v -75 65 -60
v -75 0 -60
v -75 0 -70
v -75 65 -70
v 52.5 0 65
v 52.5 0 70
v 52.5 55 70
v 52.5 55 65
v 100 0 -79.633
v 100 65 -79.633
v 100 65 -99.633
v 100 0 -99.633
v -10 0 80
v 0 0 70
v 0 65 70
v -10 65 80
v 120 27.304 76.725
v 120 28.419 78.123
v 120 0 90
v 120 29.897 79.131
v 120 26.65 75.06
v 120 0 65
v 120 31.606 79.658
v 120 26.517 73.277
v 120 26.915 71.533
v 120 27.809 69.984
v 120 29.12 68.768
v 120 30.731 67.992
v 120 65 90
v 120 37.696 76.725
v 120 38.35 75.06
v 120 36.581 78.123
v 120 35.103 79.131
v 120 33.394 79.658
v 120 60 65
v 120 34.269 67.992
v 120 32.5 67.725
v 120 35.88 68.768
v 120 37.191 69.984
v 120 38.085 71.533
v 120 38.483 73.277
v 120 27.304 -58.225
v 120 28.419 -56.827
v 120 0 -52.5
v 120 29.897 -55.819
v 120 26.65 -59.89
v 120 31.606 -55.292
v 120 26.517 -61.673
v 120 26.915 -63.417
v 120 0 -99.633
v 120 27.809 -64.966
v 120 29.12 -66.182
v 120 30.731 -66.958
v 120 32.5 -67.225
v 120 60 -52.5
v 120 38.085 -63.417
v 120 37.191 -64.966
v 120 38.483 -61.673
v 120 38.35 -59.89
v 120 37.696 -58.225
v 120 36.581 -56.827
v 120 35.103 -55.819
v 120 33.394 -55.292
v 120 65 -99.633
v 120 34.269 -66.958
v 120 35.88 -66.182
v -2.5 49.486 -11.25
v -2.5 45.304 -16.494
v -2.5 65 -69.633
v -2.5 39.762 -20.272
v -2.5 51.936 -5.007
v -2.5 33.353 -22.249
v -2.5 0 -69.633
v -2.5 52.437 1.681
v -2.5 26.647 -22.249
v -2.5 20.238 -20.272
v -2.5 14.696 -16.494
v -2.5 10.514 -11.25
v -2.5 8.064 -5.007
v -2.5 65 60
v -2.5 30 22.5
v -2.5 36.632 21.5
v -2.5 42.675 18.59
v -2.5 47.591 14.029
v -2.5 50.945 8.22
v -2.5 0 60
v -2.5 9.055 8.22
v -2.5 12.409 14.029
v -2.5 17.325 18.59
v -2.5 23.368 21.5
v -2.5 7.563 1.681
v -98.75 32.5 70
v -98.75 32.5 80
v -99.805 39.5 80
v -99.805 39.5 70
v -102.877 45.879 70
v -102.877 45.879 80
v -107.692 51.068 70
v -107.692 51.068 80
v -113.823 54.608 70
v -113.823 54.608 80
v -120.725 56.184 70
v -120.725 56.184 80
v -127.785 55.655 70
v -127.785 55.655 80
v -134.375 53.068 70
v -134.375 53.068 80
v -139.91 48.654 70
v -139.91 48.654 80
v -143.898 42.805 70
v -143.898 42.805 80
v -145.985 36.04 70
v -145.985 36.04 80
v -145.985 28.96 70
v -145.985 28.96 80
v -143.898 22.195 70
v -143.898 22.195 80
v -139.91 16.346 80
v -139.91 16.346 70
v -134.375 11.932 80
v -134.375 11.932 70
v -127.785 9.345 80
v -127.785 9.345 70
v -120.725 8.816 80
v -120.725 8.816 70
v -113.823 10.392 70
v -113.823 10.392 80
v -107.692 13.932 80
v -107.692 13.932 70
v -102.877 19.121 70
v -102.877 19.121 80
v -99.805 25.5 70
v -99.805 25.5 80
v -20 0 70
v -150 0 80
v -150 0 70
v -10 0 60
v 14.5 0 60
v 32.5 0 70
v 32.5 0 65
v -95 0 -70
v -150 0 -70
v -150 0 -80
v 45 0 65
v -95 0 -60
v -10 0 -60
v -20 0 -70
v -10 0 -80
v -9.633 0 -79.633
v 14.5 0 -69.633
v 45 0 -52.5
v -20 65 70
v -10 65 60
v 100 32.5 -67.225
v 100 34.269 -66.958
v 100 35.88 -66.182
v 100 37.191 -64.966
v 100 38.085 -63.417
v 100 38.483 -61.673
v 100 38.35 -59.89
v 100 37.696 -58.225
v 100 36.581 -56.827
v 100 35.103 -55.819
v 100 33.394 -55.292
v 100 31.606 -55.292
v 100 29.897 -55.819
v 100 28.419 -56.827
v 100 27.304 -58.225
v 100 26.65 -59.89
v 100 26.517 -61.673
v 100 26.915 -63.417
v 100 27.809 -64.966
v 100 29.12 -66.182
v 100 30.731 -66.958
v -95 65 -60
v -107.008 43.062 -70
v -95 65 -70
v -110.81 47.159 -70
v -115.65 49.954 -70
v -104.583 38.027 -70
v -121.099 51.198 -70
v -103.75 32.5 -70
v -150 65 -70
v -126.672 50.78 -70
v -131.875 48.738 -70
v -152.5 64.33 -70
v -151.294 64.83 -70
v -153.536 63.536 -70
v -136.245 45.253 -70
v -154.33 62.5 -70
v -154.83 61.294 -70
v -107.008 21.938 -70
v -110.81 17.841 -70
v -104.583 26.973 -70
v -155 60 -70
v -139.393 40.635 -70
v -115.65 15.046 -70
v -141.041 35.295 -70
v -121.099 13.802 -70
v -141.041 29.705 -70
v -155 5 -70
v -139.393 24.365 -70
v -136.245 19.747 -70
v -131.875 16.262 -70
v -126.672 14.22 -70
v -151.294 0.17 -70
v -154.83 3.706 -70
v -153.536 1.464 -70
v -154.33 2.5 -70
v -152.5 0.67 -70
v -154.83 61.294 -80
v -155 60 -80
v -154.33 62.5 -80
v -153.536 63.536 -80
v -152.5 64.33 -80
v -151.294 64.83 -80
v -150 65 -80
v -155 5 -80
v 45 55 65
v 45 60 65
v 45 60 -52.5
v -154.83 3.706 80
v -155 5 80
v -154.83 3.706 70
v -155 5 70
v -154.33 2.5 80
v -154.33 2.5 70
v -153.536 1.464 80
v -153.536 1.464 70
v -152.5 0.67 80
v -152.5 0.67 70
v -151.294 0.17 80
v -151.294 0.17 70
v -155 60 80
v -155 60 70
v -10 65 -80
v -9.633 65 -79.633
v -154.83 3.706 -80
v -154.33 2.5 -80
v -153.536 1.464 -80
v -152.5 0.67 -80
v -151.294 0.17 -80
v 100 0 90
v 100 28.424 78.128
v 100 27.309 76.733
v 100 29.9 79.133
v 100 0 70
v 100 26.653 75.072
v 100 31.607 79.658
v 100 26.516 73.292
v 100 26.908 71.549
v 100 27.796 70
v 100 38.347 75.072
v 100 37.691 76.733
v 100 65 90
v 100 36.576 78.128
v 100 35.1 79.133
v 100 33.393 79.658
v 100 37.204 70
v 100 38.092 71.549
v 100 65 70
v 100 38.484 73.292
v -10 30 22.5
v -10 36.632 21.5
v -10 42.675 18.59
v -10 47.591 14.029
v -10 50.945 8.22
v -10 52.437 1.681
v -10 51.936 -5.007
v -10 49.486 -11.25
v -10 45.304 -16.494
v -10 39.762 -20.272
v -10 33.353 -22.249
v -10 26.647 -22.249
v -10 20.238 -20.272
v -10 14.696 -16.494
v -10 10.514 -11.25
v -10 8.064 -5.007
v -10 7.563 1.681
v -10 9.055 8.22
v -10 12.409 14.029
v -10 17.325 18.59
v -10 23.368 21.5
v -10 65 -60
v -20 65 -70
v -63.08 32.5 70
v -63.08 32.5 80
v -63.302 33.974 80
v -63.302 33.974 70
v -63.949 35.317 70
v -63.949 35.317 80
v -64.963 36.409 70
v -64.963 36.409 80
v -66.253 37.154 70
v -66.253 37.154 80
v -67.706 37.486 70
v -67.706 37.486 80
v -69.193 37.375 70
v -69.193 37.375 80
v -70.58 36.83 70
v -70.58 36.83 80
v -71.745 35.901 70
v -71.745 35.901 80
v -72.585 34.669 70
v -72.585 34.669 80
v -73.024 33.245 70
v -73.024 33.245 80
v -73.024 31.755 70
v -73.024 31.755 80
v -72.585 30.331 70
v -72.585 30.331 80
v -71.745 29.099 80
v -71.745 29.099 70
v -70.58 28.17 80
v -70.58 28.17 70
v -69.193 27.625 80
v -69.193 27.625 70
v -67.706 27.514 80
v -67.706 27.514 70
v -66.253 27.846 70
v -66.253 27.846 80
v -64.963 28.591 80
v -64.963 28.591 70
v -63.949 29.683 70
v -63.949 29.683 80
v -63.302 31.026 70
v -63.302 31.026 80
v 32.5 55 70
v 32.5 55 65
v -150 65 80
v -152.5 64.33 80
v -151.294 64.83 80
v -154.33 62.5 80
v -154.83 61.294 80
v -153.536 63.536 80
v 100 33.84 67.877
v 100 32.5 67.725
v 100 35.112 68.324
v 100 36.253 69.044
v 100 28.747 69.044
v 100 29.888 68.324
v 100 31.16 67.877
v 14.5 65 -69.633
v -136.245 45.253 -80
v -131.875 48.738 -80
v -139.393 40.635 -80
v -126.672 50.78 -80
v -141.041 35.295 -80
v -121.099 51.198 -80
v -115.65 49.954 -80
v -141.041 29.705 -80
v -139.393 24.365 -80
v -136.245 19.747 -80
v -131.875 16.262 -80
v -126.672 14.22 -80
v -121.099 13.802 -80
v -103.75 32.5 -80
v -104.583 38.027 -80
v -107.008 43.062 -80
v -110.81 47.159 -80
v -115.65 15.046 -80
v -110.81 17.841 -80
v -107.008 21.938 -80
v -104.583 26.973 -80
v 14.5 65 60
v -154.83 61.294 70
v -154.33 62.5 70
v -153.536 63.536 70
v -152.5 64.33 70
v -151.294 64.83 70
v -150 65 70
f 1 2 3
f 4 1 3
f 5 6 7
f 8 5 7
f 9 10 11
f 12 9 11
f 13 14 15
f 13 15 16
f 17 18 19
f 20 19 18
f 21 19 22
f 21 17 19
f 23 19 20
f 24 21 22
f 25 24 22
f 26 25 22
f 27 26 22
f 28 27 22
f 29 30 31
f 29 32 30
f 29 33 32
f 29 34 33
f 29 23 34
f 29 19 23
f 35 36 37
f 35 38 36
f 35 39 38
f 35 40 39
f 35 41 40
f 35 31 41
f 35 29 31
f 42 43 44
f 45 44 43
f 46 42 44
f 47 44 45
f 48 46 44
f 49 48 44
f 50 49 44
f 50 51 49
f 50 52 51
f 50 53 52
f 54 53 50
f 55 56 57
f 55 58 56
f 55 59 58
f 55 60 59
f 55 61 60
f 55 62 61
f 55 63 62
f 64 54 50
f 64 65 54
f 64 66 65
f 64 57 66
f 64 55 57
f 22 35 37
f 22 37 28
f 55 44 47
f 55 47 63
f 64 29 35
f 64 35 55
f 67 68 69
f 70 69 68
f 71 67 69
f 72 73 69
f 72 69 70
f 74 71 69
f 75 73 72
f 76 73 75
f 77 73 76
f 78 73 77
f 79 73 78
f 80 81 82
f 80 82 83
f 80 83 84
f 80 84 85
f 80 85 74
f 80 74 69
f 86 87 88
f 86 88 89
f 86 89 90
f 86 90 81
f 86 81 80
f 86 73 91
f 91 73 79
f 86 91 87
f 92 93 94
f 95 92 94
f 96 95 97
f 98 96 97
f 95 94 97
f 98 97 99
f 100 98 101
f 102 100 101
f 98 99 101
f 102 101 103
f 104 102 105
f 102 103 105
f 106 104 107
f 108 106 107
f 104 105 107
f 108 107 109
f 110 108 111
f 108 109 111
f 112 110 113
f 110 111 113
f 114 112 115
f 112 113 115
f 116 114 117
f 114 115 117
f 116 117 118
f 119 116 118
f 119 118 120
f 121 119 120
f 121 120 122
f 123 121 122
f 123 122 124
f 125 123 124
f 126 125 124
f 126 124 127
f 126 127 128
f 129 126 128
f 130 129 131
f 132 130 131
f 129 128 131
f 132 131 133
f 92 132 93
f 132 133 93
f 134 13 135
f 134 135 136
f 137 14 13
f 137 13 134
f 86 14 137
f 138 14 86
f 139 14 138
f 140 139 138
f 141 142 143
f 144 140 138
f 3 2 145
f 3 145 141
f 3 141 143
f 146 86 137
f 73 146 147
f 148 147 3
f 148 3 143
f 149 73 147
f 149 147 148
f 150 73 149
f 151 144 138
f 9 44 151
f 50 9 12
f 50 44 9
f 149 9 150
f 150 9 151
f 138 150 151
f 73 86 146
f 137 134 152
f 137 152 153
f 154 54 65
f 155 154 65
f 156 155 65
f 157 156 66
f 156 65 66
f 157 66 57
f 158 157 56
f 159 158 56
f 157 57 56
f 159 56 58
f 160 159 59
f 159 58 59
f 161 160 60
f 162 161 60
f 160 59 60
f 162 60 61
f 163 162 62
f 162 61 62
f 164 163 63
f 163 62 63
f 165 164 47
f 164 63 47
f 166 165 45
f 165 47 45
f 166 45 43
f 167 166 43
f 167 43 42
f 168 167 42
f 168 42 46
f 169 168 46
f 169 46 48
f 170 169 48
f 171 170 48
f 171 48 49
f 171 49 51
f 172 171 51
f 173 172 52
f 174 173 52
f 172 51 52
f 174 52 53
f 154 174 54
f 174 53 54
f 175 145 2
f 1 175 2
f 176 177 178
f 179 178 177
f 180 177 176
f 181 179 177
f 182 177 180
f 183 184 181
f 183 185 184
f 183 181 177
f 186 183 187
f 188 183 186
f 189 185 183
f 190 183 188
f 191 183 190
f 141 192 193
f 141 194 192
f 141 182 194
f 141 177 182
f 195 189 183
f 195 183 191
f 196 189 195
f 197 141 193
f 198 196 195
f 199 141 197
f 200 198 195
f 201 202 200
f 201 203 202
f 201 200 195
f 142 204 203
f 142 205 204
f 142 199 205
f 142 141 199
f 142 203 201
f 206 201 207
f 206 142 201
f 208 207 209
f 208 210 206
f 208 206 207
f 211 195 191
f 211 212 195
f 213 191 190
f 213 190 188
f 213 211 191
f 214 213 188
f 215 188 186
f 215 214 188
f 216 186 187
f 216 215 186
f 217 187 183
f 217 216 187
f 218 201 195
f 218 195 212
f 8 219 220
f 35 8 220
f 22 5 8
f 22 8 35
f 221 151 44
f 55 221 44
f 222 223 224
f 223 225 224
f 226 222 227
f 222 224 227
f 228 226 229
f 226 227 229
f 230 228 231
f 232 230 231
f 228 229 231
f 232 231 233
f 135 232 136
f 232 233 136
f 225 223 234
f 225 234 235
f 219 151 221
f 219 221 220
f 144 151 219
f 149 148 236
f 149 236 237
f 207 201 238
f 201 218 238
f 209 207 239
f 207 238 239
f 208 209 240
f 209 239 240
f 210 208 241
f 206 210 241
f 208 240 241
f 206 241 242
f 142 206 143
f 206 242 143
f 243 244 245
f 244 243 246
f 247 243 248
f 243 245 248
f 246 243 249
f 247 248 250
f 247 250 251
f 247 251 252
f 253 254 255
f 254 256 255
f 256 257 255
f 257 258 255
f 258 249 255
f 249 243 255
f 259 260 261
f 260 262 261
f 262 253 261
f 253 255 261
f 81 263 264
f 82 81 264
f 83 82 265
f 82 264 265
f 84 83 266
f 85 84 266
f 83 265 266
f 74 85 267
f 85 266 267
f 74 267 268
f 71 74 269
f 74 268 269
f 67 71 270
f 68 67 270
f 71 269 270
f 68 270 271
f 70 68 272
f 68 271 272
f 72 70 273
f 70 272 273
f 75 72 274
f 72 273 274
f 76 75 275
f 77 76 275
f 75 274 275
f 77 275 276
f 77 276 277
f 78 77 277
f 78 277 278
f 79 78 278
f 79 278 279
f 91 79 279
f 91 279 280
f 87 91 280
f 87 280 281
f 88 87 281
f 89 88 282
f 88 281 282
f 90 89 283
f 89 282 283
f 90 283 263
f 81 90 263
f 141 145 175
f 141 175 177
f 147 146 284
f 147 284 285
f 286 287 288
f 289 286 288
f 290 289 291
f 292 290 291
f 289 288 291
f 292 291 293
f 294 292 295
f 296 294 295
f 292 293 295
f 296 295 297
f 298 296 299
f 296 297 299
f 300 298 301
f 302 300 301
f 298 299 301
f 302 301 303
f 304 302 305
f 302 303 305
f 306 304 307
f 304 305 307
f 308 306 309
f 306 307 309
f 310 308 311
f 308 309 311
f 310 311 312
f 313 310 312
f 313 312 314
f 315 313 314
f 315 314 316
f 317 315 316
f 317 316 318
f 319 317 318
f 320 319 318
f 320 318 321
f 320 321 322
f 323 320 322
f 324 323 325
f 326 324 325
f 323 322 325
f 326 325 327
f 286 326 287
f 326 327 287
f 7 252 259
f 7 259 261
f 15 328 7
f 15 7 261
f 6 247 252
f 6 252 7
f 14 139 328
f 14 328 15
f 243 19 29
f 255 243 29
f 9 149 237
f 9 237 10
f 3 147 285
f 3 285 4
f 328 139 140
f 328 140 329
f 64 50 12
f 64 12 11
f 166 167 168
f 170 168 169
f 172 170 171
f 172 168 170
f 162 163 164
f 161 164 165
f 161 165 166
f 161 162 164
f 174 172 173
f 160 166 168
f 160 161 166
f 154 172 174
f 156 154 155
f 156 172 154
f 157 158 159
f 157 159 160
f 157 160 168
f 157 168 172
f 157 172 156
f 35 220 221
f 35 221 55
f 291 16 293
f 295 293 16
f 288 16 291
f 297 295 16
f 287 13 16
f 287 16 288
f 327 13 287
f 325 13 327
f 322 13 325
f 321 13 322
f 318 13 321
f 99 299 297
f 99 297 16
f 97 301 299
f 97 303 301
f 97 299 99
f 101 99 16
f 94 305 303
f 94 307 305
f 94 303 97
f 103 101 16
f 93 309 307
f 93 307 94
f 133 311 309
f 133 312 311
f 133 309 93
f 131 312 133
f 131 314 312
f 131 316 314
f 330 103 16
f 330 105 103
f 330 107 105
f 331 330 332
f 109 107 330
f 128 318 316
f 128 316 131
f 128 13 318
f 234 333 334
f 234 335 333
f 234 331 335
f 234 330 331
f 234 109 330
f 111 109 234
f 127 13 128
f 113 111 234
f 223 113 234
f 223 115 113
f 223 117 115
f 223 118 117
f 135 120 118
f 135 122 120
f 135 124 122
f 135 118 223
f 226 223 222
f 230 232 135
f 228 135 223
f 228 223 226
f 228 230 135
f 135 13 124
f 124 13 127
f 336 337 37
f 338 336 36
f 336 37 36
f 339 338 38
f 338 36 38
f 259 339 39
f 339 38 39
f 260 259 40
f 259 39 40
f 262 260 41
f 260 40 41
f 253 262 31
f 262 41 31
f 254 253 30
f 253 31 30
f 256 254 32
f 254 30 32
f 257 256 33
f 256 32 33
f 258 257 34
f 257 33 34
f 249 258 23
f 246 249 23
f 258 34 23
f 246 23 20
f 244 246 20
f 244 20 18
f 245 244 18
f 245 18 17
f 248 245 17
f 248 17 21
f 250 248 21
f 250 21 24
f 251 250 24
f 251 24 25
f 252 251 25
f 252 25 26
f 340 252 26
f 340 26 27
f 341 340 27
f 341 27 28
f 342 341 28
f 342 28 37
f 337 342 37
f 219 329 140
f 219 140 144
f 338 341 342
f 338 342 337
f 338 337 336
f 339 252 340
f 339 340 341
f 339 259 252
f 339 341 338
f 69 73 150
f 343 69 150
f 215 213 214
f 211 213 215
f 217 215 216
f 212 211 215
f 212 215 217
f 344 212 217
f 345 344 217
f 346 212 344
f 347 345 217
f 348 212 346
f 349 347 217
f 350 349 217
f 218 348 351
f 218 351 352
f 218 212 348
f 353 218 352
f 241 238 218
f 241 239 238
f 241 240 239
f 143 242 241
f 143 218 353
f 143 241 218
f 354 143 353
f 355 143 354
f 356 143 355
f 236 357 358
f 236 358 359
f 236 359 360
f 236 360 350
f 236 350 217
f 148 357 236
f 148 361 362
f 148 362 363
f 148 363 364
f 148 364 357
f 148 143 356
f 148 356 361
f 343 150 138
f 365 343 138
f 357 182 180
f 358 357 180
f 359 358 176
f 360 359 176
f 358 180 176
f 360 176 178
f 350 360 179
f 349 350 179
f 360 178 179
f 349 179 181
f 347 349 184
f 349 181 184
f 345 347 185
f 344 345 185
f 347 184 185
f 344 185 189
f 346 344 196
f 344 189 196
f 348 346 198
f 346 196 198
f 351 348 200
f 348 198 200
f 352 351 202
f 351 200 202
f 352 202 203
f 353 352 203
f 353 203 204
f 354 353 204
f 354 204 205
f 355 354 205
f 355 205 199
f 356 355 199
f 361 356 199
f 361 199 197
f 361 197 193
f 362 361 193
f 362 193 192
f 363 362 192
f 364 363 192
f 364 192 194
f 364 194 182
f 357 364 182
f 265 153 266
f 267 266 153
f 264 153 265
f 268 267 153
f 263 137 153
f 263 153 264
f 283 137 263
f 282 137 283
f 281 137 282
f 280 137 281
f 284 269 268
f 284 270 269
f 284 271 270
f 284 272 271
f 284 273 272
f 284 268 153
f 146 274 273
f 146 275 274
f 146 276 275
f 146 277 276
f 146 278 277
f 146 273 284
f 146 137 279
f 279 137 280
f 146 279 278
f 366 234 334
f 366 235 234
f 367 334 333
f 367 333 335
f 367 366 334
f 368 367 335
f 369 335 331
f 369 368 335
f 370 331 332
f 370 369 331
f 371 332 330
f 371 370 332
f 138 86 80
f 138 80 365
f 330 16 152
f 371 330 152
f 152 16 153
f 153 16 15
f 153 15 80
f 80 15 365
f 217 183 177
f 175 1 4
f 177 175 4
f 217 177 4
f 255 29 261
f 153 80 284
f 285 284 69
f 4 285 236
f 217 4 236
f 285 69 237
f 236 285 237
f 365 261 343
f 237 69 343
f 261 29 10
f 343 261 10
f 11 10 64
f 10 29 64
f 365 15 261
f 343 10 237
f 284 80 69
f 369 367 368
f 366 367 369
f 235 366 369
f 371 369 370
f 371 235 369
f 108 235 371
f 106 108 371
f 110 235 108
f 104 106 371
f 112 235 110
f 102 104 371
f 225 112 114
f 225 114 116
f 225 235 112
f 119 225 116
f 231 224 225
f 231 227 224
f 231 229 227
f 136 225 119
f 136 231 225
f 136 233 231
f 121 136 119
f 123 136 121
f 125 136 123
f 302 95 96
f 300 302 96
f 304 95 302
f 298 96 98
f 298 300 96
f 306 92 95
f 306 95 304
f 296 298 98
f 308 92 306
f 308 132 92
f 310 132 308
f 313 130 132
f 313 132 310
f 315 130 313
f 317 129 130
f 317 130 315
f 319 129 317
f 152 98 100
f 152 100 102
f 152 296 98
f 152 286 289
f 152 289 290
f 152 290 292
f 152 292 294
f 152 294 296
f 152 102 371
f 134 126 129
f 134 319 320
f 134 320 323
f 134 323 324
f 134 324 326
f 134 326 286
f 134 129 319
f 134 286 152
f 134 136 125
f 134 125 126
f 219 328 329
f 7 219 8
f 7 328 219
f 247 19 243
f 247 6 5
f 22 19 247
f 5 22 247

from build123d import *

# Parameters (mm, degrees)
BOSS_EXTRUDE1_DEPTH = 65
FILLET1_R           = 5
SKETCH2_R           = 18.75
CUT_EXTRUDE1_DEPTH  = 80
SKETCH3_R           = 23.75
CUT_EXTRUDE2_DEPTH  = 10
BOSS_EXTRUDE2_DEPTH = 65
SKETCH5_W           = 17
SKETCH5_H           = 129.632645568
CUT_EXTRUDE3_DEPTH  = 65
SKETCH6_W           = 75
SKETCH6_H           = 117.5
CUT_EXTRUDE4_DEPTH  = 60
SKETCH7_W           = 20
SKETCH7_H           = 65
BOSS_EXTRUDE3_DEPTH = 20
SKETCH8_R           = 6
CUT_EXTRUDE6_DEPTH  = 20
SKETCH9_W           = 20
SKETCH9_H           = 55
CUT_EXTRUDE8_DEPTH  = 5
SKETCH10_R          = 22.5
CUT_EXTRUDE9_DEPTH  = 7.5
SKETCH11_W          = 20
SKETCH11_H          = 10
BOSS_EXTRUDE4_DEPTH = 65
SKETCH12_R          = 5
CUT_EXTRUDE10_DEPTH = 10


with BuildPart() as part:
    # Sketch1 → Boss-Extrude1 (new body)
    with BuildSketch(Plane(origin=(0, 0, 0), x_dir=(1, 0, 0), z_dir=(0, 1, 0))):
        Polygon((0, 70), (0, -70), (-10, -80), (-155, -80), (-155, -70), (-20, -70), (-10, -60), (-10, 60), (-20, 70), (-155, 70), (-155, 80), (-10, 80), align=None)
    extrude(amount=BOSS_EXTRUDE1_DEPTH)

    # Fillet1
    fillet1_edges = [part.edges().sort_by_distance(p)[0] for p in [
        (-155, 65, 75),
        (-155, 0, -75),
        (-155, 0, 75),
        (-155, 65, -75),
    ]]
    fillet(fillet1_edges, radius=FILLET1_R)

    # Sketch2 → Cut-Extrude1 (cut)
    with BuildSketch(Plane.XY):
        with Locations((-122.5, 32.5)):
            Circle(SKETCH2_R)
    extrude(amount=-CUT_EXTRUDE1_DEPTH, mode=Mode.SUBTRACT)

    # Sketch3 → Cut-Extrude2 (cut)
    with BuildSketch(Plane.XY.offset(80)):
        with Locations((-122.5, 32.5)):
            Circle(SKETCH3_R)
    extrude(amount=-CUT_EXTRUDE2_DEPTH, mode=Mode.SUBTRACT)

    # Sketch4 → Boss-Extrude2 (add)
    with BuildSketch(Plane(origin=(0, 0, 0), x_dir=(1, 0, 0), z_dir=(0, 1, 0))):
        Polygon((-9.632645568, 79.632645568), (120, 79.632645568), (120, -70), (0, -70), (0, 70), align=None)
    extrude(amount=BOSS_EXTRUDE2_DEPTH)

    # Sketch5 → Cut-Extrude3 (cut)
    with BuildSketch(Plane.XZ):
        with Locations((6, -4.816322784)):
            Rectangle(SKETCH5_W, SKETCH5_H)
    extrude(amount=-CUT_EXTRUDE3_DEPTH, mode=Mode.SUBTRACT)

    # Sketch6 → Cut-Extrude4 (cut)
    with BuildSketch(Plane.XZ):
        with Locations((82.5, 6.25)):
            Rectangle(SKETCH6_W, SKETCH6_H)
    extrude(amount=-CUT_EXTRUDE4_DEPTH, mode=Mode.SUBTRACT)

    # Sketch7 → Boss-Extrude3 (add)
    with BuildSketch(Plane(origin=(120, 0, 0), x_dir=(0, 0, -1), z_dir=(1, 0, 0))):
        with Locations((-80, 32.5)):
            Rectangle(SKETCH7_W, SKETCH7_H)
        with Locations((89.632645568, 32.5)):
            Rectangle(SKETCH7_W, SKETCH7_H)
    extrude(amount=-BOSS_EXTRUDE3_DEPTH)

    # Sketch8 → Cut-Extrude6 (cut)
    with BuildSketch(Plane(origin=(120, 0, 0), x_dir=(0, 0, -1), z_dir=(1, 0, 0))):
        with Locations((-73.725, 32.5)):
            Circle(SKETCH8_R)
        with Locations((61.225, 32.5)):
            Circle(SKETCH8_R)
    extrude(amount=-CUT_EXTRUDE6_DEPTH, mode=Mode.SUBTRACT)

    # Sketch9 → Cut-Extrude8 (cut)
    with BuildSketch(Plane.XY.offset(70)):
        with Locations((42.5, 27.5)):
            Rectangle(SKETCH9_W, SKETCH9_H)
    extrude(amount=-CUT_EXTRUDE8_DEPTH, mode=Mode.SUBTRACT)

    # Sketch10 → Cut-Extrude9 (cut)
    with BuildSketch(Plane.ZY.offset(10)):
        with Locations((0, 30)):
            Circle(SKETCH10_R)
    extrude(amount=-CUT_EXTRUDE9_DEPTH, mode=Mode.SUBTRACT)

    # Sketch11 → Boss-Extrude4 (add)
    with BuildSketch(Plane(origin=(0, 0, 0), x_dir=(1, 0, 0), z_dir=(0, 1, 0))):
        with Locations((-85, 65)):
            Rectangle(SKETCH11_W, SKETCH11_H)
    extrude(amount=BOSS_EXTRUDE4_DEPTH)

    # Sketch12 → Cut-Extrude10 (cut)
    with BuildSketch(Plane.XY.offset(80)):
        with Locations((-68.08, 32.5)):
            Circle(SKETCH12_R)
    extrude(amount=-CUT_EXTRUDE10_DEPTH, mode=Mode.SUBTRACT)


solid = part.part
